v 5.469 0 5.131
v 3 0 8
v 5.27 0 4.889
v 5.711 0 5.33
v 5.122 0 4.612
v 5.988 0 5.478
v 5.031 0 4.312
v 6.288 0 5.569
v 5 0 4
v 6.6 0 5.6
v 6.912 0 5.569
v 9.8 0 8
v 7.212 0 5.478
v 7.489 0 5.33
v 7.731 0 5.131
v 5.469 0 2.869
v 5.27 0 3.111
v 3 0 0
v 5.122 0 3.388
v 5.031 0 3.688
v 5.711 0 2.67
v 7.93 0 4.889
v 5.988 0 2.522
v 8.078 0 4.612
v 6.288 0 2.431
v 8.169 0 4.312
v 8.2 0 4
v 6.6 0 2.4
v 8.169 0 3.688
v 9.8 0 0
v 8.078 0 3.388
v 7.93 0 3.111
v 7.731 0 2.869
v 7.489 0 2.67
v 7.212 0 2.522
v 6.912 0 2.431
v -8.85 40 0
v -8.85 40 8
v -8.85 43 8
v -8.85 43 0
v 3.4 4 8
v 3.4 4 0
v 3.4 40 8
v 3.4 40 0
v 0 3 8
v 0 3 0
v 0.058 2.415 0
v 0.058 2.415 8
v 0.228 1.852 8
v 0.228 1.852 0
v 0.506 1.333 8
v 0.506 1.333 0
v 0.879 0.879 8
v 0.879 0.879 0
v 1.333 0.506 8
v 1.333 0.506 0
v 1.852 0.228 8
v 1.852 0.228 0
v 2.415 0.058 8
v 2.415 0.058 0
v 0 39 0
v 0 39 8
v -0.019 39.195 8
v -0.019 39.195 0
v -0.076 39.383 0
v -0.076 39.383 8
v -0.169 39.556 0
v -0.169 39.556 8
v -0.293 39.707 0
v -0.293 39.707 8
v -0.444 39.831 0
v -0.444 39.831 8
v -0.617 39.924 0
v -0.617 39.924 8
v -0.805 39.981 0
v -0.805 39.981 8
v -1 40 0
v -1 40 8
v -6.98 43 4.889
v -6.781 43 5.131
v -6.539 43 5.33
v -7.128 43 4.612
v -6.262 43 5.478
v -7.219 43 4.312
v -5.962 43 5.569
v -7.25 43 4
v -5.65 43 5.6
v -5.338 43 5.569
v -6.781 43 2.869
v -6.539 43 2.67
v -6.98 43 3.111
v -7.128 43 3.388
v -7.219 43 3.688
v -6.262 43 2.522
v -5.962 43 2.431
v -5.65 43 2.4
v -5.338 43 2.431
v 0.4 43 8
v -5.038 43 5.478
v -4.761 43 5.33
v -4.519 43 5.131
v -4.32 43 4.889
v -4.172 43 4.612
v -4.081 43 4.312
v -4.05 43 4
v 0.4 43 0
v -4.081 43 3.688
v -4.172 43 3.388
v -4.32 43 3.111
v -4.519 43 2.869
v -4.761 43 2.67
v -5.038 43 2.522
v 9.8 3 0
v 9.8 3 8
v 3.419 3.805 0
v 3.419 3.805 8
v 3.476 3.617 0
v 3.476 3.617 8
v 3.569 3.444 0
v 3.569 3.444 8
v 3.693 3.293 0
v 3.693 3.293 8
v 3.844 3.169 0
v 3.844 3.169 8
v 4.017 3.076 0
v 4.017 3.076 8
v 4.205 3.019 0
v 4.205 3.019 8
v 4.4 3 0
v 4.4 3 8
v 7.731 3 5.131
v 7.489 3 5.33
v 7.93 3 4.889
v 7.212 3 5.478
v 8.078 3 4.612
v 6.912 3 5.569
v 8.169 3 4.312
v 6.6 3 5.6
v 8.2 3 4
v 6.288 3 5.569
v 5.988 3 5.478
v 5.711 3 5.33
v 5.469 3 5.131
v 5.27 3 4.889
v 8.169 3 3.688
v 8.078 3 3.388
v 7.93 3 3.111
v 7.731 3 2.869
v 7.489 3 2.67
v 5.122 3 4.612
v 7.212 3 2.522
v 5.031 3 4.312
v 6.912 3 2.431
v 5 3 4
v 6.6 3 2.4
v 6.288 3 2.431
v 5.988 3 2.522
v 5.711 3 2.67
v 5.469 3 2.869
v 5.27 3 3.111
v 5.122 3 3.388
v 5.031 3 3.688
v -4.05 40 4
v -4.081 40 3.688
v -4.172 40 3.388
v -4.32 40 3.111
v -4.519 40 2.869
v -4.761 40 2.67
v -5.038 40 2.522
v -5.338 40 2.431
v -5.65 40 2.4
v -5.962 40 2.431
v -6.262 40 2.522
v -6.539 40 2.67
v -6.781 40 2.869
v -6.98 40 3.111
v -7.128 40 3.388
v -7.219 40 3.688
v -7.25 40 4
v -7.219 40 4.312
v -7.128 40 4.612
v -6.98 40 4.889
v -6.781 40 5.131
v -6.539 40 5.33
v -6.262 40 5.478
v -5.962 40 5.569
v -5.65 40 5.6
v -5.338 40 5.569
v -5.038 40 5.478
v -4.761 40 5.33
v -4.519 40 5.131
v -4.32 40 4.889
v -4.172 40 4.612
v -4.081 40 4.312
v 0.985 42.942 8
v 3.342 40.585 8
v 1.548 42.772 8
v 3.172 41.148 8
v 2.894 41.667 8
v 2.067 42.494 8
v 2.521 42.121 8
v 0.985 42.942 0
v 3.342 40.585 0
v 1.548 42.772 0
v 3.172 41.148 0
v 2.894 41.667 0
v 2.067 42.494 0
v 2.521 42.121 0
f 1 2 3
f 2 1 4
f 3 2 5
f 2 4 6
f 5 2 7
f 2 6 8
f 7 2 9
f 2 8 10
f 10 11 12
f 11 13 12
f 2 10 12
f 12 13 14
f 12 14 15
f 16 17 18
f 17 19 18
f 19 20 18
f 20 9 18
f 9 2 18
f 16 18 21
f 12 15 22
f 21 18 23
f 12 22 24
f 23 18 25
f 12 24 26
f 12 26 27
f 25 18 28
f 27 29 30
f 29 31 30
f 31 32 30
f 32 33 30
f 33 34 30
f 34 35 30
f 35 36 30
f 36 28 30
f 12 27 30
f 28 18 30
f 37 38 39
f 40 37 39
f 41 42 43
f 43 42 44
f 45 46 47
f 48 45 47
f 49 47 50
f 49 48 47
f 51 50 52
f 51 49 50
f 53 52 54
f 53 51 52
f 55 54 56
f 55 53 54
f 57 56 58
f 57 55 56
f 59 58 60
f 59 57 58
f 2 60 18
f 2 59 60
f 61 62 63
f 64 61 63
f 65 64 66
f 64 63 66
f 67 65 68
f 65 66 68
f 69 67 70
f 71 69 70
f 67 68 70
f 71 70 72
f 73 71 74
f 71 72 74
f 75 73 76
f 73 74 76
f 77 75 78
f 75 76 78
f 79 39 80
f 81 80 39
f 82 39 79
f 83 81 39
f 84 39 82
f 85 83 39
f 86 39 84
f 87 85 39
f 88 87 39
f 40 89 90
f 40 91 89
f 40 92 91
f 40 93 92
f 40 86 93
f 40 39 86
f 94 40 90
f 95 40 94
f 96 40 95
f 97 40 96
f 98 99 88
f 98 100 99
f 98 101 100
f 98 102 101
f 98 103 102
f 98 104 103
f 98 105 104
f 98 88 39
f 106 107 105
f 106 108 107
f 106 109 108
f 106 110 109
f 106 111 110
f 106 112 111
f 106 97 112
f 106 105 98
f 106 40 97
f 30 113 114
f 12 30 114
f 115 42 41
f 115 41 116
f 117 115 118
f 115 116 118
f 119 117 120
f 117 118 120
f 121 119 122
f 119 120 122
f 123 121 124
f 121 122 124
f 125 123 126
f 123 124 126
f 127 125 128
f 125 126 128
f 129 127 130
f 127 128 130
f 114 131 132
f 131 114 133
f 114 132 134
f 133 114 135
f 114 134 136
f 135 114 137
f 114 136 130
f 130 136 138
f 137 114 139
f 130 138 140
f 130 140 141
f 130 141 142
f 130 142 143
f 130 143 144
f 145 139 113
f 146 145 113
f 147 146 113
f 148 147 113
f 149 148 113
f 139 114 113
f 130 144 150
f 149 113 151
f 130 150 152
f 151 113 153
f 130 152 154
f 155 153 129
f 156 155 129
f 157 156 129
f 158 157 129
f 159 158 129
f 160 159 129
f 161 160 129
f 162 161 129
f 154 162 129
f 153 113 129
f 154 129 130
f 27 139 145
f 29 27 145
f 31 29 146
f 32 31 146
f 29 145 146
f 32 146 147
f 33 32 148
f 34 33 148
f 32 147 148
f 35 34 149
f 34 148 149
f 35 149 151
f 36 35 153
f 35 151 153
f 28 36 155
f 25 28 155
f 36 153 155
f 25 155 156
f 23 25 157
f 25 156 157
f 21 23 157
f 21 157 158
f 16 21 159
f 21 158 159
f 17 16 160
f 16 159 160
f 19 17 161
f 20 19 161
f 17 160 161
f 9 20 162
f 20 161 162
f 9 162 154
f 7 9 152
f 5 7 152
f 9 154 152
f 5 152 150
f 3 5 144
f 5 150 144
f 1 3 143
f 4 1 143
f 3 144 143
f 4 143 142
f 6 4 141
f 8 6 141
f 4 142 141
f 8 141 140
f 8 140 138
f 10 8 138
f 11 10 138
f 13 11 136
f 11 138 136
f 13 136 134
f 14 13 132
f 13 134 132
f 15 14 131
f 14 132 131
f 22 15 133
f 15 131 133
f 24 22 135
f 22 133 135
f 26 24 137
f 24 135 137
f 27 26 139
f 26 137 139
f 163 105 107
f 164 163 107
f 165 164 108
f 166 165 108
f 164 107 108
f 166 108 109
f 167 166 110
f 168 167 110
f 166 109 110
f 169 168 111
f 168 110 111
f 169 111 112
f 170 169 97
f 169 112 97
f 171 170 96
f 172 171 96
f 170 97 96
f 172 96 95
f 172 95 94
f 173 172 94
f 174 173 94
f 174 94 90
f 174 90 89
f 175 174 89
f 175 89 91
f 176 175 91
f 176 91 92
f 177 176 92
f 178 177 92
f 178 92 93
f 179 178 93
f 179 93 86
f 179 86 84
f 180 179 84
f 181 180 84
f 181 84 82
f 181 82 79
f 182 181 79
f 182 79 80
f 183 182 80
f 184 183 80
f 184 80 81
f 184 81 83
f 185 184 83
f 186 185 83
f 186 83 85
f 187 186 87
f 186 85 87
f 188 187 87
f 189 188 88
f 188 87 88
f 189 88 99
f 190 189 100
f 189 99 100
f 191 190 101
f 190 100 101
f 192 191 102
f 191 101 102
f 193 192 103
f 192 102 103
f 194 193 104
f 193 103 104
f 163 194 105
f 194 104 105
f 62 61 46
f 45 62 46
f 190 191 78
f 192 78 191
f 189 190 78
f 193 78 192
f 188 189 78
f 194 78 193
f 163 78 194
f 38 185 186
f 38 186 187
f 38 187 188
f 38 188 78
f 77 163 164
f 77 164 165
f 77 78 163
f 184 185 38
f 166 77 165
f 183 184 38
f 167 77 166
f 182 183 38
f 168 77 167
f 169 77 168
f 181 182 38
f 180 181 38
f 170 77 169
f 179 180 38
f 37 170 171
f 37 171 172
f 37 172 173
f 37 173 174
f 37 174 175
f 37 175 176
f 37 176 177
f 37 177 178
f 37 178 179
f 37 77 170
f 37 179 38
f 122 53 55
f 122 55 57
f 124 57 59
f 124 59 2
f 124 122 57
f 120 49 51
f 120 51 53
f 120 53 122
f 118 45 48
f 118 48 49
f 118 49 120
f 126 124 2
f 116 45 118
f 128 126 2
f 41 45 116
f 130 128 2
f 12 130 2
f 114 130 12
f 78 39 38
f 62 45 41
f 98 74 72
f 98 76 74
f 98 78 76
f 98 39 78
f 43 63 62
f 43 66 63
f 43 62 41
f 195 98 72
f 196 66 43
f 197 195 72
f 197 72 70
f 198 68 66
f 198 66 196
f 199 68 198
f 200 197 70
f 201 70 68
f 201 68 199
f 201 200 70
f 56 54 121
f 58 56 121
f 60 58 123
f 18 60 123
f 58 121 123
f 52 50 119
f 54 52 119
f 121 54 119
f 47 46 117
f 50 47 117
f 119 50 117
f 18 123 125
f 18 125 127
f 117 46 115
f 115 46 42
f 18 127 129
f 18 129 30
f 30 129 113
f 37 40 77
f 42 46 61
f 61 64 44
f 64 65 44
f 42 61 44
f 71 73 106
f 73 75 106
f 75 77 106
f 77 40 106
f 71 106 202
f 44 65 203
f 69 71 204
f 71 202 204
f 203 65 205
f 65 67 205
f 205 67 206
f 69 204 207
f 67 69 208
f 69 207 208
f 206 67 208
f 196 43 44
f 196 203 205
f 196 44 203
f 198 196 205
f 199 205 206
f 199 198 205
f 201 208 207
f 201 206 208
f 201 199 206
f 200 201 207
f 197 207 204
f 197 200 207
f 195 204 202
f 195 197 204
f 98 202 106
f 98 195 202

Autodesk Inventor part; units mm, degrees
ref_plane "YZ Plane" through (0, 0, 0) normal (1, 0, 0) x (0, 1, 0)
ref_plane "XZ Plane" through (0, 0, 0) normal (0, 1, 0) x (-1, 0, 0)
ref_plane "XY Plane" through (0, 0, 0) normal (0, 0, 1) x (1, 0, 0)
sketch "Sketch1" plane through (0, 0, 0) normal (0, 0, 1) x (1, 0, 0)
  line L0 (0, 0) -> (3.4, 0)
  line L1 (3.4, 0) -> (3.4, 40)
  line L2 (3.4, 40) -> (0, 40)
  line L3 (0, 40) -> (0, 0)
  line L4 (3.4, 40) -> (-8.85, 40)
  line L5 (-8.85, 40) -> (-8.85, 43)
  line L6 (-8.85, 43) -> (3.4, 43)
  line L7 (3.4, 43) -> (3.4, 40)
  line L8 (3.4, 0) -> (12.25, 0)
  line L9 (12.25, 0) -> (12.25, 3)
  line L10 (12.25, 3) -> (3.4, 3)
  line L11 (3.4, 3) -> (3.4, 0)
  line L12 (-5.65, 43) -> (-5.65, 40) construction
  line L13 (-7.25, 43) -> (-7.25, 40) construction
  line L14 (-4.05, 40) -> (-4.05, 43) construction
  dimension "d0" = 40
  dimension "d1" = 3.4
  dimension "d3" = 5.65
  dimension "d4" = 3.2
  dimension "d5" = 1.6
  dimension "d6" = 1.6
  dimension "d7" = 3
  dimension "d8" = 3
  dimension "d9" = 12.25
  dimension "d10" = 12.25
extrude "Extrusion1" add sketch "Sketch1" along normal blind 8
sketch "Sketch2" plane through (-8.85, 43, 0) normal (0, 1, 0) x (1, 0, 0)
  line L0 (12.25, 0) -> (0, 0) projected
  line L1 (0, 0) -> (0, -8) projected
  line L2 (12.25, -8) -> (0, -8) projected
  line L3 (12.25, 0) -> (12.25, -8) projected
  line L4 (21.1, 0) -> (12.25, 0) projected
  line L5 (12.25, 0) -> (12.25, -8) projected
  line L6 (21.1, -8) -> (12.25, -8) projected
  line L7 (21.1, 0) -> (21.1, -8) projected
  circle A0 centre (3.2, -4) radius 1.6
  circle A1 centre (15.45, -4) radius 1.6
  line L8 (21.1, 0) -> (18.65, 0)
  line L9 (18.65, 0) -> (18.65, -8)
  line L10 (18.65, -8) -> (21.1, -8)
  line L11 (21.1, -8) -> (21.1, 0)
  point P0 (8.85, 0)
  dimension "d13" = 3.2
  dimension "d14" = 3.2
  dimension "d15" = 3.2
  dimension "d21" = 3.2
  dimension "d22" = 3.2
extrude "Extrusion2" cut sketch "Sketch2" against normal blind 51.5 contours L4 L7 L6 L9 | A0 | A1
fillet "Fillet1" radius 3 2 edges at (3.4, 43, 4) (0, 0, 4)
fillet "Fillet2" radius 1 2 edges at (3.4, 3, 4) (0, 40, 4)
equation "\"d5\" = 0.5 * d4"
equation "\"d6\" = d5"
equation "\"d10\" = d9"
properties part number "MotorBracket"
